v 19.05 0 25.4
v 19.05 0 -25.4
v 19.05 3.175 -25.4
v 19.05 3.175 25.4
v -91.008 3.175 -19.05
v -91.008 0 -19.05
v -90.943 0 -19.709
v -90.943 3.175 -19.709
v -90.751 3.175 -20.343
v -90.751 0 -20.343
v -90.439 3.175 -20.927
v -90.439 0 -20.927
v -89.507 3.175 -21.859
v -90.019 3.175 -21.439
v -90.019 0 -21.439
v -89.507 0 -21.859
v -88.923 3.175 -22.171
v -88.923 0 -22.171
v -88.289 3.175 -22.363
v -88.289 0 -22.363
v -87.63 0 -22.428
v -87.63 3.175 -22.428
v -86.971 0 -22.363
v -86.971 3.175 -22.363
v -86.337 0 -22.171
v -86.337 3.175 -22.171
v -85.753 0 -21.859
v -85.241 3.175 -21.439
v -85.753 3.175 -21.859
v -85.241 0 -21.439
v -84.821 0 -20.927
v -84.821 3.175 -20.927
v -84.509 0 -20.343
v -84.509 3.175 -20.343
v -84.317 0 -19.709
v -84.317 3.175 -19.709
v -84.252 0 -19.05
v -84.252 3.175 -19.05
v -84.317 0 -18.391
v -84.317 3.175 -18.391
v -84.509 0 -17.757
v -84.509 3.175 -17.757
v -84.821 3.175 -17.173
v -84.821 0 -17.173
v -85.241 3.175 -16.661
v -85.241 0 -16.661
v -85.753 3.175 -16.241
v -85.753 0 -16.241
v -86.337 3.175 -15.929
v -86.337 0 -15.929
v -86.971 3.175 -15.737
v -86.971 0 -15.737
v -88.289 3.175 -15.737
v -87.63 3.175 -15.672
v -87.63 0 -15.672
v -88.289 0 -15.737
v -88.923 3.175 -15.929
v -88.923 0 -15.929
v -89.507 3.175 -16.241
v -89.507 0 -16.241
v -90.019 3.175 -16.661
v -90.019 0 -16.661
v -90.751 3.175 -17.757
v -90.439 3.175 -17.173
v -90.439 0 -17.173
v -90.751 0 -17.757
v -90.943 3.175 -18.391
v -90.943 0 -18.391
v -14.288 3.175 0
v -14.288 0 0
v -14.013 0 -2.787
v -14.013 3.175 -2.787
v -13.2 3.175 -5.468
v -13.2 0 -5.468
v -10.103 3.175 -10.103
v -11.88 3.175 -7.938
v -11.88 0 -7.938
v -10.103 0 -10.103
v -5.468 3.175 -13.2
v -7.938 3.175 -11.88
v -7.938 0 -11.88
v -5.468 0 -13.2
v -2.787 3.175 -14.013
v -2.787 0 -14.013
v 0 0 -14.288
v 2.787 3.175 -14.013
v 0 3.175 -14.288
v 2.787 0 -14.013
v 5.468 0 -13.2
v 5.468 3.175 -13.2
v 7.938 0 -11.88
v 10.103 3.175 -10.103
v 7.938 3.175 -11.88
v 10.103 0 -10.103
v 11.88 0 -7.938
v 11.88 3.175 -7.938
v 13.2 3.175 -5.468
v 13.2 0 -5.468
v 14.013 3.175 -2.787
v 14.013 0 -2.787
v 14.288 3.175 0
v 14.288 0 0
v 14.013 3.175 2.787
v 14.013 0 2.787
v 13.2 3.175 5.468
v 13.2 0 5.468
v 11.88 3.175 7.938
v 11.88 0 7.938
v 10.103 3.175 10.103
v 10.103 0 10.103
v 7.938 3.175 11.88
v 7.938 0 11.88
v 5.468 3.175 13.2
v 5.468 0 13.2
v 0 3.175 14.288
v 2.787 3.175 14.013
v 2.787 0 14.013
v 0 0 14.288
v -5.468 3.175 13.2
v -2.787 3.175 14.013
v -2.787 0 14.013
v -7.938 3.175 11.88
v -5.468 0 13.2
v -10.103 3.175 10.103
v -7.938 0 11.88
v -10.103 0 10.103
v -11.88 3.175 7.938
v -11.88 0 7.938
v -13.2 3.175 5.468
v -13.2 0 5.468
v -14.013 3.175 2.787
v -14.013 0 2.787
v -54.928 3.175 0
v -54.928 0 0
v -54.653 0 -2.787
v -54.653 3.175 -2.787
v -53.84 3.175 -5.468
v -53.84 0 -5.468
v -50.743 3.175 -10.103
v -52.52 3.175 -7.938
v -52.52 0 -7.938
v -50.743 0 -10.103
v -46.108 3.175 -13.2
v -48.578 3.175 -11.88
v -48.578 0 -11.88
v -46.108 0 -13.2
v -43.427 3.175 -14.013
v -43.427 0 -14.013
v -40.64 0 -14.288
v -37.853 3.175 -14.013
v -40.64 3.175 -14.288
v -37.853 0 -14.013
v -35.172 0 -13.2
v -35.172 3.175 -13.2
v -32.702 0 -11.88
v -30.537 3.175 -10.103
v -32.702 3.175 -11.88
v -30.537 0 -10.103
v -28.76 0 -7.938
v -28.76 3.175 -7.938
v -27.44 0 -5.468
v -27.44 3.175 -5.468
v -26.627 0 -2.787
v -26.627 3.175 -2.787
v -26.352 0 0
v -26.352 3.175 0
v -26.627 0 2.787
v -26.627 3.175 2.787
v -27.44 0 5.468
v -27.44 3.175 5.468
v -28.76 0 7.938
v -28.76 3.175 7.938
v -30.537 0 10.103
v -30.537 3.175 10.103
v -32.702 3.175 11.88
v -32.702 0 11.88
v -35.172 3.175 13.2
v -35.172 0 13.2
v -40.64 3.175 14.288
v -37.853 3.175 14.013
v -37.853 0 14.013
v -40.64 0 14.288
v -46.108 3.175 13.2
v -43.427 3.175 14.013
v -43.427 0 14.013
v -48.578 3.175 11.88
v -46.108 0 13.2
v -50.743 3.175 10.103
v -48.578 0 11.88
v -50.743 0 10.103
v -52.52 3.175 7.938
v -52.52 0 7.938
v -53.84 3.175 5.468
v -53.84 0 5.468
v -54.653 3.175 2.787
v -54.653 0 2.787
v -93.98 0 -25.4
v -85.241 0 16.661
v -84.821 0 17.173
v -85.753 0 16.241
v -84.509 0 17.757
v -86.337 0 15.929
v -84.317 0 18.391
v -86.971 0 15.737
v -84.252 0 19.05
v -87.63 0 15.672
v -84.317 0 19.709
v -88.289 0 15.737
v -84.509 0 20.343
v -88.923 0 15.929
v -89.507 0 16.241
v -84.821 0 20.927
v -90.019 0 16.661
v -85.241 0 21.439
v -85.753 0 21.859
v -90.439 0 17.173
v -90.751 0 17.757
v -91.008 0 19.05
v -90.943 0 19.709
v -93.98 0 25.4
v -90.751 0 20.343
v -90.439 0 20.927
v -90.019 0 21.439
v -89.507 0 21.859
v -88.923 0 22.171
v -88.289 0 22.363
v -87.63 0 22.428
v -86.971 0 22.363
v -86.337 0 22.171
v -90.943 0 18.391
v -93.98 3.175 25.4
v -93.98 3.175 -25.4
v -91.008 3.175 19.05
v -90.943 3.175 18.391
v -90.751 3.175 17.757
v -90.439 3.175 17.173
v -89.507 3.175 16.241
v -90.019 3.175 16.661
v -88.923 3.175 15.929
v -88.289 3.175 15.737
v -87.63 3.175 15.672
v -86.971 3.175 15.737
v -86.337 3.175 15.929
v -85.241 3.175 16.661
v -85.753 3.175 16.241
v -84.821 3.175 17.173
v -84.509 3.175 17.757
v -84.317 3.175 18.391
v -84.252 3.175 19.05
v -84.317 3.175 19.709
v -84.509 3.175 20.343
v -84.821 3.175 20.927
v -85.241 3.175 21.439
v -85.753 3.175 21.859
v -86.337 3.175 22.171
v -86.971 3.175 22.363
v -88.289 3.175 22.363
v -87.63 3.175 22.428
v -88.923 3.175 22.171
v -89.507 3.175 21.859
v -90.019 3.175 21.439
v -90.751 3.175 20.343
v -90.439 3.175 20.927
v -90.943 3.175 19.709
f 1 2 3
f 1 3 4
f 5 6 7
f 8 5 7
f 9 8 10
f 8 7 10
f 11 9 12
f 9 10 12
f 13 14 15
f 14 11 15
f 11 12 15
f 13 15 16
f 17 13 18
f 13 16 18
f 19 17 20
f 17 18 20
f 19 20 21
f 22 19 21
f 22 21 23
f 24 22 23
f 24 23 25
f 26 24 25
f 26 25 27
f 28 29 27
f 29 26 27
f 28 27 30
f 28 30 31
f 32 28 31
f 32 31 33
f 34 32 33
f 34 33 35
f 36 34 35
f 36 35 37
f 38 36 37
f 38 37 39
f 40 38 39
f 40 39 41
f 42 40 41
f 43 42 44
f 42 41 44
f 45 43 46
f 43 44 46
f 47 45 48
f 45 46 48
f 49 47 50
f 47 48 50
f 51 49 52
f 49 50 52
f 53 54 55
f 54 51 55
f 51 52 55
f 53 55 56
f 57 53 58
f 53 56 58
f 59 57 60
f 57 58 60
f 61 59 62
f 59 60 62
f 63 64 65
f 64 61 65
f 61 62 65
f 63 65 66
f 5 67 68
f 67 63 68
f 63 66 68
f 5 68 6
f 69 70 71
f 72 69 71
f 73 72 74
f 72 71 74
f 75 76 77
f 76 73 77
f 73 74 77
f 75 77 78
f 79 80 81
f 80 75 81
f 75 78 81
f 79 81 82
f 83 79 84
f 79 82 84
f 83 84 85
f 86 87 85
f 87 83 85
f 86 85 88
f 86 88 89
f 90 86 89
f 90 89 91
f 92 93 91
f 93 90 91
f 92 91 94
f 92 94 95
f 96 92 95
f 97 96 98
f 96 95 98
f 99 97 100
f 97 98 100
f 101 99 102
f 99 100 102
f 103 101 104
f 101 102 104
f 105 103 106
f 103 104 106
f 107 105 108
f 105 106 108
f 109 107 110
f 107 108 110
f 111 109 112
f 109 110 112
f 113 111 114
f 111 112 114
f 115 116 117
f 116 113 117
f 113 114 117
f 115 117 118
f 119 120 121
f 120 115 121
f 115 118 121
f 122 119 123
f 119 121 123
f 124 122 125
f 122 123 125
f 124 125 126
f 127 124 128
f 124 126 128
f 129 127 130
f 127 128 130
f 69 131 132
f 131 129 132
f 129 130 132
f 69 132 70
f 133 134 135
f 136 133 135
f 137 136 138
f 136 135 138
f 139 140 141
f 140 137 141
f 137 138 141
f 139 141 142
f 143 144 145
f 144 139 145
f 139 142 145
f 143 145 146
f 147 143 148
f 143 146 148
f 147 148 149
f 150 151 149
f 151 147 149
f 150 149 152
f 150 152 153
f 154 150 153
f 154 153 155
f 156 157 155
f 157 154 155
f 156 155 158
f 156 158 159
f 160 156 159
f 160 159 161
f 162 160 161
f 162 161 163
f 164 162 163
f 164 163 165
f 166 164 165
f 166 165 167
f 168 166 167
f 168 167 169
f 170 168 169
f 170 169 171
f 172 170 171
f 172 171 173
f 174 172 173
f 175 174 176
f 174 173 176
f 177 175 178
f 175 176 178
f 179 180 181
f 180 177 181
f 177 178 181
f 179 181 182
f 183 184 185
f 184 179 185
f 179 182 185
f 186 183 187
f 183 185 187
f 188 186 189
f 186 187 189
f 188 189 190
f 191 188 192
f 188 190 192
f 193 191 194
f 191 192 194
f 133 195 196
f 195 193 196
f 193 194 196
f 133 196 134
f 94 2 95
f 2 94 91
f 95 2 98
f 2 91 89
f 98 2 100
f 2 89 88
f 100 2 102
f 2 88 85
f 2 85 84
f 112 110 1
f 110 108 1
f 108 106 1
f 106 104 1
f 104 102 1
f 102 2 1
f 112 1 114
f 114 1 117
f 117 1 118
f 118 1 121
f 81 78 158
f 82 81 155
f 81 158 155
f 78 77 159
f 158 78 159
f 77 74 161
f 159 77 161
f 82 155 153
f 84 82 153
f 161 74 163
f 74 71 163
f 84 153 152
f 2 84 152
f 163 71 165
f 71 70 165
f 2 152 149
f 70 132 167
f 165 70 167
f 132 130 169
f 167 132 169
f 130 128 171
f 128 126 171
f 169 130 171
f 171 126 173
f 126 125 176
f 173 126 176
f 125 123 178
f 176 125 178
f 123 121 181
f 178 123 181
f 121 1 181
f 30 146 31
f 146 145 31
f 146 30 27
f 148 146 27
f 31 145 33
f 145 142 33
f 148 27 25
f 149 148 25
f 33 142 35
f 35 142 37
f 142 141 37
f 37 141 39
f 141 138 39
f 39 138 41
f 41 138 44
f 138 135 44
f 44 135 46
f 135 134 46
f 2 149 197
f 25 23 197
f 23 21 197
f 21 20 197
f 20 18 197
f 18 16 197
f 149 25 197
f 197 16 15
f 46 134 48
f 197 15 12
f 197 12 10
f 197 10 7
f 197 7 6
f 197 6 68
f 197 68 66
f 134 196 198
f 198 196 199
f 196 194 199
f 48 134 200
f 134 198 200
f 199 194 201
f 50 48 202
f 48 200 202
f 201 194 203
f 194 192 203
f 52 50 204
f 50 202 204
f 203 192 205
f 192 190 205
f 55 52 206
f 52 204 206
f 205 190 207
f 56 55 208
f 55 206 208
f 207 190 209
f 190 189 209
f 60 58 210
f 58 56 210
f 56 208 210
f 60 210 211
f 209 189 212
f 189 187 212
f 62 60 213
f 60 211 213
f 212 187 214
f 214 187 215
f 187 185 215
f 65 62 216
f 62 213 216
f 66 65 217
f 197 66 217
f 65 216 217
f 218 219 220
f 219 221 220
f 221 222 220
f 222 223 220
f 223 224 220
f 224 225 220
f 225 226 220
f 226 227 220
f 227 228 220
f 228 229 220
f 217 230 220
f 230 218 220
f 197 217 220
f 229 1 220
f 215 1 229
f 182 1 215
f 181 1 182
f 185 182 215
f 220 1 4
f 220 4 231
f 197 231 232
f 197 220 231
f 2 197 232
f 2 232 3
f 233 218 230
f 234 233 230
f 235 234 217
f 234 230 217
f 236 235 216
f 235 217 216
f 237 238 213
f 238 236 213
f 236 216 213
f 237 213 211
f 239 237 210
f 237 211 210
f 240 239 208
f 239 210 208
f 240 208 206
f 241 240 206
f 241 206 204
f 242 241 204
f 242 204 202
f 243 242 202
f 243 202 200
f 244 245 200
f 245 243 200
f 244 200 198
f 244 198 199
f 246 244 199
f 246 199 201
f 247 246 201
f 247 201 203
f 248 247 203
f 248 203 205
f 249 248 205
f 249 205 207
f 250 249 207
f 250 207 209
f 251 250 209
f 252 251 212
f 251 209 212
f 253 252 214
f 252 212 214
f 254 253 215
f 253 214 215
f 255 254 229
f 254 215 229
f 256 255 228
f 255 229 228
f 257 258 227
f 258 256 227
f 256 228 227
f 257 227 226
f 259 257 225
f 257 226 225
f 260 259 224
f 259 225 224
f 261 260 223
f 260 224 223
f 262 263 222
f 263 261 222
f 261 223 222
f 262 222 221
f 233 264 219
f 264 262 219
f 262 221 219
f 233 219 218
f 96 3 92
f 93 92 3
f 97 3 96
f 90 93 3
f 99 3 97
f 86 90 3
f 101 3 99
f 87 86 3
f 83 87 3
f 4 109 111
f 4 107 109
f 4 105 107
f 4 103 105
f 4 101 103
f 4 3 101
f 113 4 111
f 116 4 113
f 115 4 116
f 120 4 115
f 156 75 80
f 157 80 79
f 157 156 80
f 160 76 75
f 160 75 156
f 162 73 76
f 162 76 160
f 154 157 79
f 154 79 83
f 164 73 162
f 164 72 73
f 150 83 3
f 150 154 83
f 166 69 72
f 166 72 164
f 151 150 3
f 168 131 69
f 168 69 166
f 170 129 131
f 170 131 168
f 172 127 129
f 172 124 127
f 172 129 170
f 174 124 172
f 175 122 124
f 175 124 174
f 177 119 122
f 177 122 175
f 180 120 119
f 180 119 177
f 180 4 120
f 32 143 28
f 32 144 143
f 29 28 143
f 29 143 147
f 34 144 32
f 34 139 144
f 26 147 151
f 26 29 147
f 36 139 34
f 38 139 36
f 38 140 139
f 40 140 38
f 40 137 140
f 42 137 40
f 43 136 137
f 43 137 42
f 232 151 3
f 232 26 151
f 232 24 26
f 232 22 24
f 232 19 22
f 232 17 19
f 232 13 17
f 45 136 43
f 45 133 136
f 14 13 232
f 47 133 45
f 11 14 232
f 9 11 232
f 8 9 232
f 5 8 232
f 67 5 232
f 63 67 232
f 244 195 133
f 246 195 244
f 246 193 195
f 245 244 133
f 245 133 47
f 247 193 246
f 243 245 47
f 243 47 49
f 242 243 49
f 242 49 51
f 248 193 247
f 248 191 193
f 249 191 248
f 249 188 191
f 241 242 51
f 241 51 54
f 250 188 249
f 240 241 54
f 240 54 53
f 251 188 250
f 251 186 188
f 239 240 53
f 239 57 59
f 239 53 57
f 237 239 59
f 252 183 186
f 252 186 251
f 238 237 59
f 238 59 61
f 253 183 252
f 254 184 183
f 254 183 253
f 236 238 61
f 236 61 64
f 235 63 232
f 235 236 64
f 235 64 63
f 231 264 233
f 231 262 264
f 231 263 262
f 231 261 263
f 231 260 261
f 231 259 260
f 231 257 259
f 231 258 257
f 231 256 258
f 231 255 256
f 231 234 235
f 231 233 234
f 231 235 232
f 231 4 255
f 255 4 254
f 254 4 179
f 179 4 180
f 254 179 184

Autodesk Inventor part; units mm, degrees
ref_plane "YZ Plane" through (0, 0, 0) normal (1, 0, 0) x (0, 1, 0)
ref_plane "XZ Plane" through (0, 0, 0) normal (0, 1, 0) x (-1, 0, 0)
ref_plane "XY Plane" through (0, 0, 0) normal (0, 0, 1) x (1, 0, 0)
sketch "Sketch1" plane through (0, 0, 0) normal (0, 1, 0) x (-1, 0, 0)
  circle A0 centre (0, 0) radius 14.2875
  circle A1 centre (87.63, -19.05) radius 3.3782
  circle A2 centre (87.63, 19.05) radius 3.3782
  circle A3 centre (40.64, 0) radius 14.2875
  line L0 (-19.05, 25.4) -> (93.98, 25.4)
  line L1 (93.98, 25.4) -> (93.98, -25.4)
  line L2 (93.98, -25.4) -> (-19.05, -25.4)
  line L3 (-19.05, -25.4) -> (-19.05, 25.4)
  dimension "d0" = 28.575
  dimension "d1" = 6.7564
  dimension "d2" = 6.7564
  dimension "d3" = 19.05
  dimension "d4" = 19.05
  dimension "d5" = 0
  dimension "d6" = 87.63
  dimension "d8" = 28.575
  dimension "d9" = 40.64
  dimension "d10" = 6.35
  dimension "d11" = 6.35
  dimension "d12" = 6.35
  dimension "d13" = 19.05
extrude "Extrusion1" add sketch "Sketch1" along normal blind 3.175
properties part number "Bearing Plate 2-1"
